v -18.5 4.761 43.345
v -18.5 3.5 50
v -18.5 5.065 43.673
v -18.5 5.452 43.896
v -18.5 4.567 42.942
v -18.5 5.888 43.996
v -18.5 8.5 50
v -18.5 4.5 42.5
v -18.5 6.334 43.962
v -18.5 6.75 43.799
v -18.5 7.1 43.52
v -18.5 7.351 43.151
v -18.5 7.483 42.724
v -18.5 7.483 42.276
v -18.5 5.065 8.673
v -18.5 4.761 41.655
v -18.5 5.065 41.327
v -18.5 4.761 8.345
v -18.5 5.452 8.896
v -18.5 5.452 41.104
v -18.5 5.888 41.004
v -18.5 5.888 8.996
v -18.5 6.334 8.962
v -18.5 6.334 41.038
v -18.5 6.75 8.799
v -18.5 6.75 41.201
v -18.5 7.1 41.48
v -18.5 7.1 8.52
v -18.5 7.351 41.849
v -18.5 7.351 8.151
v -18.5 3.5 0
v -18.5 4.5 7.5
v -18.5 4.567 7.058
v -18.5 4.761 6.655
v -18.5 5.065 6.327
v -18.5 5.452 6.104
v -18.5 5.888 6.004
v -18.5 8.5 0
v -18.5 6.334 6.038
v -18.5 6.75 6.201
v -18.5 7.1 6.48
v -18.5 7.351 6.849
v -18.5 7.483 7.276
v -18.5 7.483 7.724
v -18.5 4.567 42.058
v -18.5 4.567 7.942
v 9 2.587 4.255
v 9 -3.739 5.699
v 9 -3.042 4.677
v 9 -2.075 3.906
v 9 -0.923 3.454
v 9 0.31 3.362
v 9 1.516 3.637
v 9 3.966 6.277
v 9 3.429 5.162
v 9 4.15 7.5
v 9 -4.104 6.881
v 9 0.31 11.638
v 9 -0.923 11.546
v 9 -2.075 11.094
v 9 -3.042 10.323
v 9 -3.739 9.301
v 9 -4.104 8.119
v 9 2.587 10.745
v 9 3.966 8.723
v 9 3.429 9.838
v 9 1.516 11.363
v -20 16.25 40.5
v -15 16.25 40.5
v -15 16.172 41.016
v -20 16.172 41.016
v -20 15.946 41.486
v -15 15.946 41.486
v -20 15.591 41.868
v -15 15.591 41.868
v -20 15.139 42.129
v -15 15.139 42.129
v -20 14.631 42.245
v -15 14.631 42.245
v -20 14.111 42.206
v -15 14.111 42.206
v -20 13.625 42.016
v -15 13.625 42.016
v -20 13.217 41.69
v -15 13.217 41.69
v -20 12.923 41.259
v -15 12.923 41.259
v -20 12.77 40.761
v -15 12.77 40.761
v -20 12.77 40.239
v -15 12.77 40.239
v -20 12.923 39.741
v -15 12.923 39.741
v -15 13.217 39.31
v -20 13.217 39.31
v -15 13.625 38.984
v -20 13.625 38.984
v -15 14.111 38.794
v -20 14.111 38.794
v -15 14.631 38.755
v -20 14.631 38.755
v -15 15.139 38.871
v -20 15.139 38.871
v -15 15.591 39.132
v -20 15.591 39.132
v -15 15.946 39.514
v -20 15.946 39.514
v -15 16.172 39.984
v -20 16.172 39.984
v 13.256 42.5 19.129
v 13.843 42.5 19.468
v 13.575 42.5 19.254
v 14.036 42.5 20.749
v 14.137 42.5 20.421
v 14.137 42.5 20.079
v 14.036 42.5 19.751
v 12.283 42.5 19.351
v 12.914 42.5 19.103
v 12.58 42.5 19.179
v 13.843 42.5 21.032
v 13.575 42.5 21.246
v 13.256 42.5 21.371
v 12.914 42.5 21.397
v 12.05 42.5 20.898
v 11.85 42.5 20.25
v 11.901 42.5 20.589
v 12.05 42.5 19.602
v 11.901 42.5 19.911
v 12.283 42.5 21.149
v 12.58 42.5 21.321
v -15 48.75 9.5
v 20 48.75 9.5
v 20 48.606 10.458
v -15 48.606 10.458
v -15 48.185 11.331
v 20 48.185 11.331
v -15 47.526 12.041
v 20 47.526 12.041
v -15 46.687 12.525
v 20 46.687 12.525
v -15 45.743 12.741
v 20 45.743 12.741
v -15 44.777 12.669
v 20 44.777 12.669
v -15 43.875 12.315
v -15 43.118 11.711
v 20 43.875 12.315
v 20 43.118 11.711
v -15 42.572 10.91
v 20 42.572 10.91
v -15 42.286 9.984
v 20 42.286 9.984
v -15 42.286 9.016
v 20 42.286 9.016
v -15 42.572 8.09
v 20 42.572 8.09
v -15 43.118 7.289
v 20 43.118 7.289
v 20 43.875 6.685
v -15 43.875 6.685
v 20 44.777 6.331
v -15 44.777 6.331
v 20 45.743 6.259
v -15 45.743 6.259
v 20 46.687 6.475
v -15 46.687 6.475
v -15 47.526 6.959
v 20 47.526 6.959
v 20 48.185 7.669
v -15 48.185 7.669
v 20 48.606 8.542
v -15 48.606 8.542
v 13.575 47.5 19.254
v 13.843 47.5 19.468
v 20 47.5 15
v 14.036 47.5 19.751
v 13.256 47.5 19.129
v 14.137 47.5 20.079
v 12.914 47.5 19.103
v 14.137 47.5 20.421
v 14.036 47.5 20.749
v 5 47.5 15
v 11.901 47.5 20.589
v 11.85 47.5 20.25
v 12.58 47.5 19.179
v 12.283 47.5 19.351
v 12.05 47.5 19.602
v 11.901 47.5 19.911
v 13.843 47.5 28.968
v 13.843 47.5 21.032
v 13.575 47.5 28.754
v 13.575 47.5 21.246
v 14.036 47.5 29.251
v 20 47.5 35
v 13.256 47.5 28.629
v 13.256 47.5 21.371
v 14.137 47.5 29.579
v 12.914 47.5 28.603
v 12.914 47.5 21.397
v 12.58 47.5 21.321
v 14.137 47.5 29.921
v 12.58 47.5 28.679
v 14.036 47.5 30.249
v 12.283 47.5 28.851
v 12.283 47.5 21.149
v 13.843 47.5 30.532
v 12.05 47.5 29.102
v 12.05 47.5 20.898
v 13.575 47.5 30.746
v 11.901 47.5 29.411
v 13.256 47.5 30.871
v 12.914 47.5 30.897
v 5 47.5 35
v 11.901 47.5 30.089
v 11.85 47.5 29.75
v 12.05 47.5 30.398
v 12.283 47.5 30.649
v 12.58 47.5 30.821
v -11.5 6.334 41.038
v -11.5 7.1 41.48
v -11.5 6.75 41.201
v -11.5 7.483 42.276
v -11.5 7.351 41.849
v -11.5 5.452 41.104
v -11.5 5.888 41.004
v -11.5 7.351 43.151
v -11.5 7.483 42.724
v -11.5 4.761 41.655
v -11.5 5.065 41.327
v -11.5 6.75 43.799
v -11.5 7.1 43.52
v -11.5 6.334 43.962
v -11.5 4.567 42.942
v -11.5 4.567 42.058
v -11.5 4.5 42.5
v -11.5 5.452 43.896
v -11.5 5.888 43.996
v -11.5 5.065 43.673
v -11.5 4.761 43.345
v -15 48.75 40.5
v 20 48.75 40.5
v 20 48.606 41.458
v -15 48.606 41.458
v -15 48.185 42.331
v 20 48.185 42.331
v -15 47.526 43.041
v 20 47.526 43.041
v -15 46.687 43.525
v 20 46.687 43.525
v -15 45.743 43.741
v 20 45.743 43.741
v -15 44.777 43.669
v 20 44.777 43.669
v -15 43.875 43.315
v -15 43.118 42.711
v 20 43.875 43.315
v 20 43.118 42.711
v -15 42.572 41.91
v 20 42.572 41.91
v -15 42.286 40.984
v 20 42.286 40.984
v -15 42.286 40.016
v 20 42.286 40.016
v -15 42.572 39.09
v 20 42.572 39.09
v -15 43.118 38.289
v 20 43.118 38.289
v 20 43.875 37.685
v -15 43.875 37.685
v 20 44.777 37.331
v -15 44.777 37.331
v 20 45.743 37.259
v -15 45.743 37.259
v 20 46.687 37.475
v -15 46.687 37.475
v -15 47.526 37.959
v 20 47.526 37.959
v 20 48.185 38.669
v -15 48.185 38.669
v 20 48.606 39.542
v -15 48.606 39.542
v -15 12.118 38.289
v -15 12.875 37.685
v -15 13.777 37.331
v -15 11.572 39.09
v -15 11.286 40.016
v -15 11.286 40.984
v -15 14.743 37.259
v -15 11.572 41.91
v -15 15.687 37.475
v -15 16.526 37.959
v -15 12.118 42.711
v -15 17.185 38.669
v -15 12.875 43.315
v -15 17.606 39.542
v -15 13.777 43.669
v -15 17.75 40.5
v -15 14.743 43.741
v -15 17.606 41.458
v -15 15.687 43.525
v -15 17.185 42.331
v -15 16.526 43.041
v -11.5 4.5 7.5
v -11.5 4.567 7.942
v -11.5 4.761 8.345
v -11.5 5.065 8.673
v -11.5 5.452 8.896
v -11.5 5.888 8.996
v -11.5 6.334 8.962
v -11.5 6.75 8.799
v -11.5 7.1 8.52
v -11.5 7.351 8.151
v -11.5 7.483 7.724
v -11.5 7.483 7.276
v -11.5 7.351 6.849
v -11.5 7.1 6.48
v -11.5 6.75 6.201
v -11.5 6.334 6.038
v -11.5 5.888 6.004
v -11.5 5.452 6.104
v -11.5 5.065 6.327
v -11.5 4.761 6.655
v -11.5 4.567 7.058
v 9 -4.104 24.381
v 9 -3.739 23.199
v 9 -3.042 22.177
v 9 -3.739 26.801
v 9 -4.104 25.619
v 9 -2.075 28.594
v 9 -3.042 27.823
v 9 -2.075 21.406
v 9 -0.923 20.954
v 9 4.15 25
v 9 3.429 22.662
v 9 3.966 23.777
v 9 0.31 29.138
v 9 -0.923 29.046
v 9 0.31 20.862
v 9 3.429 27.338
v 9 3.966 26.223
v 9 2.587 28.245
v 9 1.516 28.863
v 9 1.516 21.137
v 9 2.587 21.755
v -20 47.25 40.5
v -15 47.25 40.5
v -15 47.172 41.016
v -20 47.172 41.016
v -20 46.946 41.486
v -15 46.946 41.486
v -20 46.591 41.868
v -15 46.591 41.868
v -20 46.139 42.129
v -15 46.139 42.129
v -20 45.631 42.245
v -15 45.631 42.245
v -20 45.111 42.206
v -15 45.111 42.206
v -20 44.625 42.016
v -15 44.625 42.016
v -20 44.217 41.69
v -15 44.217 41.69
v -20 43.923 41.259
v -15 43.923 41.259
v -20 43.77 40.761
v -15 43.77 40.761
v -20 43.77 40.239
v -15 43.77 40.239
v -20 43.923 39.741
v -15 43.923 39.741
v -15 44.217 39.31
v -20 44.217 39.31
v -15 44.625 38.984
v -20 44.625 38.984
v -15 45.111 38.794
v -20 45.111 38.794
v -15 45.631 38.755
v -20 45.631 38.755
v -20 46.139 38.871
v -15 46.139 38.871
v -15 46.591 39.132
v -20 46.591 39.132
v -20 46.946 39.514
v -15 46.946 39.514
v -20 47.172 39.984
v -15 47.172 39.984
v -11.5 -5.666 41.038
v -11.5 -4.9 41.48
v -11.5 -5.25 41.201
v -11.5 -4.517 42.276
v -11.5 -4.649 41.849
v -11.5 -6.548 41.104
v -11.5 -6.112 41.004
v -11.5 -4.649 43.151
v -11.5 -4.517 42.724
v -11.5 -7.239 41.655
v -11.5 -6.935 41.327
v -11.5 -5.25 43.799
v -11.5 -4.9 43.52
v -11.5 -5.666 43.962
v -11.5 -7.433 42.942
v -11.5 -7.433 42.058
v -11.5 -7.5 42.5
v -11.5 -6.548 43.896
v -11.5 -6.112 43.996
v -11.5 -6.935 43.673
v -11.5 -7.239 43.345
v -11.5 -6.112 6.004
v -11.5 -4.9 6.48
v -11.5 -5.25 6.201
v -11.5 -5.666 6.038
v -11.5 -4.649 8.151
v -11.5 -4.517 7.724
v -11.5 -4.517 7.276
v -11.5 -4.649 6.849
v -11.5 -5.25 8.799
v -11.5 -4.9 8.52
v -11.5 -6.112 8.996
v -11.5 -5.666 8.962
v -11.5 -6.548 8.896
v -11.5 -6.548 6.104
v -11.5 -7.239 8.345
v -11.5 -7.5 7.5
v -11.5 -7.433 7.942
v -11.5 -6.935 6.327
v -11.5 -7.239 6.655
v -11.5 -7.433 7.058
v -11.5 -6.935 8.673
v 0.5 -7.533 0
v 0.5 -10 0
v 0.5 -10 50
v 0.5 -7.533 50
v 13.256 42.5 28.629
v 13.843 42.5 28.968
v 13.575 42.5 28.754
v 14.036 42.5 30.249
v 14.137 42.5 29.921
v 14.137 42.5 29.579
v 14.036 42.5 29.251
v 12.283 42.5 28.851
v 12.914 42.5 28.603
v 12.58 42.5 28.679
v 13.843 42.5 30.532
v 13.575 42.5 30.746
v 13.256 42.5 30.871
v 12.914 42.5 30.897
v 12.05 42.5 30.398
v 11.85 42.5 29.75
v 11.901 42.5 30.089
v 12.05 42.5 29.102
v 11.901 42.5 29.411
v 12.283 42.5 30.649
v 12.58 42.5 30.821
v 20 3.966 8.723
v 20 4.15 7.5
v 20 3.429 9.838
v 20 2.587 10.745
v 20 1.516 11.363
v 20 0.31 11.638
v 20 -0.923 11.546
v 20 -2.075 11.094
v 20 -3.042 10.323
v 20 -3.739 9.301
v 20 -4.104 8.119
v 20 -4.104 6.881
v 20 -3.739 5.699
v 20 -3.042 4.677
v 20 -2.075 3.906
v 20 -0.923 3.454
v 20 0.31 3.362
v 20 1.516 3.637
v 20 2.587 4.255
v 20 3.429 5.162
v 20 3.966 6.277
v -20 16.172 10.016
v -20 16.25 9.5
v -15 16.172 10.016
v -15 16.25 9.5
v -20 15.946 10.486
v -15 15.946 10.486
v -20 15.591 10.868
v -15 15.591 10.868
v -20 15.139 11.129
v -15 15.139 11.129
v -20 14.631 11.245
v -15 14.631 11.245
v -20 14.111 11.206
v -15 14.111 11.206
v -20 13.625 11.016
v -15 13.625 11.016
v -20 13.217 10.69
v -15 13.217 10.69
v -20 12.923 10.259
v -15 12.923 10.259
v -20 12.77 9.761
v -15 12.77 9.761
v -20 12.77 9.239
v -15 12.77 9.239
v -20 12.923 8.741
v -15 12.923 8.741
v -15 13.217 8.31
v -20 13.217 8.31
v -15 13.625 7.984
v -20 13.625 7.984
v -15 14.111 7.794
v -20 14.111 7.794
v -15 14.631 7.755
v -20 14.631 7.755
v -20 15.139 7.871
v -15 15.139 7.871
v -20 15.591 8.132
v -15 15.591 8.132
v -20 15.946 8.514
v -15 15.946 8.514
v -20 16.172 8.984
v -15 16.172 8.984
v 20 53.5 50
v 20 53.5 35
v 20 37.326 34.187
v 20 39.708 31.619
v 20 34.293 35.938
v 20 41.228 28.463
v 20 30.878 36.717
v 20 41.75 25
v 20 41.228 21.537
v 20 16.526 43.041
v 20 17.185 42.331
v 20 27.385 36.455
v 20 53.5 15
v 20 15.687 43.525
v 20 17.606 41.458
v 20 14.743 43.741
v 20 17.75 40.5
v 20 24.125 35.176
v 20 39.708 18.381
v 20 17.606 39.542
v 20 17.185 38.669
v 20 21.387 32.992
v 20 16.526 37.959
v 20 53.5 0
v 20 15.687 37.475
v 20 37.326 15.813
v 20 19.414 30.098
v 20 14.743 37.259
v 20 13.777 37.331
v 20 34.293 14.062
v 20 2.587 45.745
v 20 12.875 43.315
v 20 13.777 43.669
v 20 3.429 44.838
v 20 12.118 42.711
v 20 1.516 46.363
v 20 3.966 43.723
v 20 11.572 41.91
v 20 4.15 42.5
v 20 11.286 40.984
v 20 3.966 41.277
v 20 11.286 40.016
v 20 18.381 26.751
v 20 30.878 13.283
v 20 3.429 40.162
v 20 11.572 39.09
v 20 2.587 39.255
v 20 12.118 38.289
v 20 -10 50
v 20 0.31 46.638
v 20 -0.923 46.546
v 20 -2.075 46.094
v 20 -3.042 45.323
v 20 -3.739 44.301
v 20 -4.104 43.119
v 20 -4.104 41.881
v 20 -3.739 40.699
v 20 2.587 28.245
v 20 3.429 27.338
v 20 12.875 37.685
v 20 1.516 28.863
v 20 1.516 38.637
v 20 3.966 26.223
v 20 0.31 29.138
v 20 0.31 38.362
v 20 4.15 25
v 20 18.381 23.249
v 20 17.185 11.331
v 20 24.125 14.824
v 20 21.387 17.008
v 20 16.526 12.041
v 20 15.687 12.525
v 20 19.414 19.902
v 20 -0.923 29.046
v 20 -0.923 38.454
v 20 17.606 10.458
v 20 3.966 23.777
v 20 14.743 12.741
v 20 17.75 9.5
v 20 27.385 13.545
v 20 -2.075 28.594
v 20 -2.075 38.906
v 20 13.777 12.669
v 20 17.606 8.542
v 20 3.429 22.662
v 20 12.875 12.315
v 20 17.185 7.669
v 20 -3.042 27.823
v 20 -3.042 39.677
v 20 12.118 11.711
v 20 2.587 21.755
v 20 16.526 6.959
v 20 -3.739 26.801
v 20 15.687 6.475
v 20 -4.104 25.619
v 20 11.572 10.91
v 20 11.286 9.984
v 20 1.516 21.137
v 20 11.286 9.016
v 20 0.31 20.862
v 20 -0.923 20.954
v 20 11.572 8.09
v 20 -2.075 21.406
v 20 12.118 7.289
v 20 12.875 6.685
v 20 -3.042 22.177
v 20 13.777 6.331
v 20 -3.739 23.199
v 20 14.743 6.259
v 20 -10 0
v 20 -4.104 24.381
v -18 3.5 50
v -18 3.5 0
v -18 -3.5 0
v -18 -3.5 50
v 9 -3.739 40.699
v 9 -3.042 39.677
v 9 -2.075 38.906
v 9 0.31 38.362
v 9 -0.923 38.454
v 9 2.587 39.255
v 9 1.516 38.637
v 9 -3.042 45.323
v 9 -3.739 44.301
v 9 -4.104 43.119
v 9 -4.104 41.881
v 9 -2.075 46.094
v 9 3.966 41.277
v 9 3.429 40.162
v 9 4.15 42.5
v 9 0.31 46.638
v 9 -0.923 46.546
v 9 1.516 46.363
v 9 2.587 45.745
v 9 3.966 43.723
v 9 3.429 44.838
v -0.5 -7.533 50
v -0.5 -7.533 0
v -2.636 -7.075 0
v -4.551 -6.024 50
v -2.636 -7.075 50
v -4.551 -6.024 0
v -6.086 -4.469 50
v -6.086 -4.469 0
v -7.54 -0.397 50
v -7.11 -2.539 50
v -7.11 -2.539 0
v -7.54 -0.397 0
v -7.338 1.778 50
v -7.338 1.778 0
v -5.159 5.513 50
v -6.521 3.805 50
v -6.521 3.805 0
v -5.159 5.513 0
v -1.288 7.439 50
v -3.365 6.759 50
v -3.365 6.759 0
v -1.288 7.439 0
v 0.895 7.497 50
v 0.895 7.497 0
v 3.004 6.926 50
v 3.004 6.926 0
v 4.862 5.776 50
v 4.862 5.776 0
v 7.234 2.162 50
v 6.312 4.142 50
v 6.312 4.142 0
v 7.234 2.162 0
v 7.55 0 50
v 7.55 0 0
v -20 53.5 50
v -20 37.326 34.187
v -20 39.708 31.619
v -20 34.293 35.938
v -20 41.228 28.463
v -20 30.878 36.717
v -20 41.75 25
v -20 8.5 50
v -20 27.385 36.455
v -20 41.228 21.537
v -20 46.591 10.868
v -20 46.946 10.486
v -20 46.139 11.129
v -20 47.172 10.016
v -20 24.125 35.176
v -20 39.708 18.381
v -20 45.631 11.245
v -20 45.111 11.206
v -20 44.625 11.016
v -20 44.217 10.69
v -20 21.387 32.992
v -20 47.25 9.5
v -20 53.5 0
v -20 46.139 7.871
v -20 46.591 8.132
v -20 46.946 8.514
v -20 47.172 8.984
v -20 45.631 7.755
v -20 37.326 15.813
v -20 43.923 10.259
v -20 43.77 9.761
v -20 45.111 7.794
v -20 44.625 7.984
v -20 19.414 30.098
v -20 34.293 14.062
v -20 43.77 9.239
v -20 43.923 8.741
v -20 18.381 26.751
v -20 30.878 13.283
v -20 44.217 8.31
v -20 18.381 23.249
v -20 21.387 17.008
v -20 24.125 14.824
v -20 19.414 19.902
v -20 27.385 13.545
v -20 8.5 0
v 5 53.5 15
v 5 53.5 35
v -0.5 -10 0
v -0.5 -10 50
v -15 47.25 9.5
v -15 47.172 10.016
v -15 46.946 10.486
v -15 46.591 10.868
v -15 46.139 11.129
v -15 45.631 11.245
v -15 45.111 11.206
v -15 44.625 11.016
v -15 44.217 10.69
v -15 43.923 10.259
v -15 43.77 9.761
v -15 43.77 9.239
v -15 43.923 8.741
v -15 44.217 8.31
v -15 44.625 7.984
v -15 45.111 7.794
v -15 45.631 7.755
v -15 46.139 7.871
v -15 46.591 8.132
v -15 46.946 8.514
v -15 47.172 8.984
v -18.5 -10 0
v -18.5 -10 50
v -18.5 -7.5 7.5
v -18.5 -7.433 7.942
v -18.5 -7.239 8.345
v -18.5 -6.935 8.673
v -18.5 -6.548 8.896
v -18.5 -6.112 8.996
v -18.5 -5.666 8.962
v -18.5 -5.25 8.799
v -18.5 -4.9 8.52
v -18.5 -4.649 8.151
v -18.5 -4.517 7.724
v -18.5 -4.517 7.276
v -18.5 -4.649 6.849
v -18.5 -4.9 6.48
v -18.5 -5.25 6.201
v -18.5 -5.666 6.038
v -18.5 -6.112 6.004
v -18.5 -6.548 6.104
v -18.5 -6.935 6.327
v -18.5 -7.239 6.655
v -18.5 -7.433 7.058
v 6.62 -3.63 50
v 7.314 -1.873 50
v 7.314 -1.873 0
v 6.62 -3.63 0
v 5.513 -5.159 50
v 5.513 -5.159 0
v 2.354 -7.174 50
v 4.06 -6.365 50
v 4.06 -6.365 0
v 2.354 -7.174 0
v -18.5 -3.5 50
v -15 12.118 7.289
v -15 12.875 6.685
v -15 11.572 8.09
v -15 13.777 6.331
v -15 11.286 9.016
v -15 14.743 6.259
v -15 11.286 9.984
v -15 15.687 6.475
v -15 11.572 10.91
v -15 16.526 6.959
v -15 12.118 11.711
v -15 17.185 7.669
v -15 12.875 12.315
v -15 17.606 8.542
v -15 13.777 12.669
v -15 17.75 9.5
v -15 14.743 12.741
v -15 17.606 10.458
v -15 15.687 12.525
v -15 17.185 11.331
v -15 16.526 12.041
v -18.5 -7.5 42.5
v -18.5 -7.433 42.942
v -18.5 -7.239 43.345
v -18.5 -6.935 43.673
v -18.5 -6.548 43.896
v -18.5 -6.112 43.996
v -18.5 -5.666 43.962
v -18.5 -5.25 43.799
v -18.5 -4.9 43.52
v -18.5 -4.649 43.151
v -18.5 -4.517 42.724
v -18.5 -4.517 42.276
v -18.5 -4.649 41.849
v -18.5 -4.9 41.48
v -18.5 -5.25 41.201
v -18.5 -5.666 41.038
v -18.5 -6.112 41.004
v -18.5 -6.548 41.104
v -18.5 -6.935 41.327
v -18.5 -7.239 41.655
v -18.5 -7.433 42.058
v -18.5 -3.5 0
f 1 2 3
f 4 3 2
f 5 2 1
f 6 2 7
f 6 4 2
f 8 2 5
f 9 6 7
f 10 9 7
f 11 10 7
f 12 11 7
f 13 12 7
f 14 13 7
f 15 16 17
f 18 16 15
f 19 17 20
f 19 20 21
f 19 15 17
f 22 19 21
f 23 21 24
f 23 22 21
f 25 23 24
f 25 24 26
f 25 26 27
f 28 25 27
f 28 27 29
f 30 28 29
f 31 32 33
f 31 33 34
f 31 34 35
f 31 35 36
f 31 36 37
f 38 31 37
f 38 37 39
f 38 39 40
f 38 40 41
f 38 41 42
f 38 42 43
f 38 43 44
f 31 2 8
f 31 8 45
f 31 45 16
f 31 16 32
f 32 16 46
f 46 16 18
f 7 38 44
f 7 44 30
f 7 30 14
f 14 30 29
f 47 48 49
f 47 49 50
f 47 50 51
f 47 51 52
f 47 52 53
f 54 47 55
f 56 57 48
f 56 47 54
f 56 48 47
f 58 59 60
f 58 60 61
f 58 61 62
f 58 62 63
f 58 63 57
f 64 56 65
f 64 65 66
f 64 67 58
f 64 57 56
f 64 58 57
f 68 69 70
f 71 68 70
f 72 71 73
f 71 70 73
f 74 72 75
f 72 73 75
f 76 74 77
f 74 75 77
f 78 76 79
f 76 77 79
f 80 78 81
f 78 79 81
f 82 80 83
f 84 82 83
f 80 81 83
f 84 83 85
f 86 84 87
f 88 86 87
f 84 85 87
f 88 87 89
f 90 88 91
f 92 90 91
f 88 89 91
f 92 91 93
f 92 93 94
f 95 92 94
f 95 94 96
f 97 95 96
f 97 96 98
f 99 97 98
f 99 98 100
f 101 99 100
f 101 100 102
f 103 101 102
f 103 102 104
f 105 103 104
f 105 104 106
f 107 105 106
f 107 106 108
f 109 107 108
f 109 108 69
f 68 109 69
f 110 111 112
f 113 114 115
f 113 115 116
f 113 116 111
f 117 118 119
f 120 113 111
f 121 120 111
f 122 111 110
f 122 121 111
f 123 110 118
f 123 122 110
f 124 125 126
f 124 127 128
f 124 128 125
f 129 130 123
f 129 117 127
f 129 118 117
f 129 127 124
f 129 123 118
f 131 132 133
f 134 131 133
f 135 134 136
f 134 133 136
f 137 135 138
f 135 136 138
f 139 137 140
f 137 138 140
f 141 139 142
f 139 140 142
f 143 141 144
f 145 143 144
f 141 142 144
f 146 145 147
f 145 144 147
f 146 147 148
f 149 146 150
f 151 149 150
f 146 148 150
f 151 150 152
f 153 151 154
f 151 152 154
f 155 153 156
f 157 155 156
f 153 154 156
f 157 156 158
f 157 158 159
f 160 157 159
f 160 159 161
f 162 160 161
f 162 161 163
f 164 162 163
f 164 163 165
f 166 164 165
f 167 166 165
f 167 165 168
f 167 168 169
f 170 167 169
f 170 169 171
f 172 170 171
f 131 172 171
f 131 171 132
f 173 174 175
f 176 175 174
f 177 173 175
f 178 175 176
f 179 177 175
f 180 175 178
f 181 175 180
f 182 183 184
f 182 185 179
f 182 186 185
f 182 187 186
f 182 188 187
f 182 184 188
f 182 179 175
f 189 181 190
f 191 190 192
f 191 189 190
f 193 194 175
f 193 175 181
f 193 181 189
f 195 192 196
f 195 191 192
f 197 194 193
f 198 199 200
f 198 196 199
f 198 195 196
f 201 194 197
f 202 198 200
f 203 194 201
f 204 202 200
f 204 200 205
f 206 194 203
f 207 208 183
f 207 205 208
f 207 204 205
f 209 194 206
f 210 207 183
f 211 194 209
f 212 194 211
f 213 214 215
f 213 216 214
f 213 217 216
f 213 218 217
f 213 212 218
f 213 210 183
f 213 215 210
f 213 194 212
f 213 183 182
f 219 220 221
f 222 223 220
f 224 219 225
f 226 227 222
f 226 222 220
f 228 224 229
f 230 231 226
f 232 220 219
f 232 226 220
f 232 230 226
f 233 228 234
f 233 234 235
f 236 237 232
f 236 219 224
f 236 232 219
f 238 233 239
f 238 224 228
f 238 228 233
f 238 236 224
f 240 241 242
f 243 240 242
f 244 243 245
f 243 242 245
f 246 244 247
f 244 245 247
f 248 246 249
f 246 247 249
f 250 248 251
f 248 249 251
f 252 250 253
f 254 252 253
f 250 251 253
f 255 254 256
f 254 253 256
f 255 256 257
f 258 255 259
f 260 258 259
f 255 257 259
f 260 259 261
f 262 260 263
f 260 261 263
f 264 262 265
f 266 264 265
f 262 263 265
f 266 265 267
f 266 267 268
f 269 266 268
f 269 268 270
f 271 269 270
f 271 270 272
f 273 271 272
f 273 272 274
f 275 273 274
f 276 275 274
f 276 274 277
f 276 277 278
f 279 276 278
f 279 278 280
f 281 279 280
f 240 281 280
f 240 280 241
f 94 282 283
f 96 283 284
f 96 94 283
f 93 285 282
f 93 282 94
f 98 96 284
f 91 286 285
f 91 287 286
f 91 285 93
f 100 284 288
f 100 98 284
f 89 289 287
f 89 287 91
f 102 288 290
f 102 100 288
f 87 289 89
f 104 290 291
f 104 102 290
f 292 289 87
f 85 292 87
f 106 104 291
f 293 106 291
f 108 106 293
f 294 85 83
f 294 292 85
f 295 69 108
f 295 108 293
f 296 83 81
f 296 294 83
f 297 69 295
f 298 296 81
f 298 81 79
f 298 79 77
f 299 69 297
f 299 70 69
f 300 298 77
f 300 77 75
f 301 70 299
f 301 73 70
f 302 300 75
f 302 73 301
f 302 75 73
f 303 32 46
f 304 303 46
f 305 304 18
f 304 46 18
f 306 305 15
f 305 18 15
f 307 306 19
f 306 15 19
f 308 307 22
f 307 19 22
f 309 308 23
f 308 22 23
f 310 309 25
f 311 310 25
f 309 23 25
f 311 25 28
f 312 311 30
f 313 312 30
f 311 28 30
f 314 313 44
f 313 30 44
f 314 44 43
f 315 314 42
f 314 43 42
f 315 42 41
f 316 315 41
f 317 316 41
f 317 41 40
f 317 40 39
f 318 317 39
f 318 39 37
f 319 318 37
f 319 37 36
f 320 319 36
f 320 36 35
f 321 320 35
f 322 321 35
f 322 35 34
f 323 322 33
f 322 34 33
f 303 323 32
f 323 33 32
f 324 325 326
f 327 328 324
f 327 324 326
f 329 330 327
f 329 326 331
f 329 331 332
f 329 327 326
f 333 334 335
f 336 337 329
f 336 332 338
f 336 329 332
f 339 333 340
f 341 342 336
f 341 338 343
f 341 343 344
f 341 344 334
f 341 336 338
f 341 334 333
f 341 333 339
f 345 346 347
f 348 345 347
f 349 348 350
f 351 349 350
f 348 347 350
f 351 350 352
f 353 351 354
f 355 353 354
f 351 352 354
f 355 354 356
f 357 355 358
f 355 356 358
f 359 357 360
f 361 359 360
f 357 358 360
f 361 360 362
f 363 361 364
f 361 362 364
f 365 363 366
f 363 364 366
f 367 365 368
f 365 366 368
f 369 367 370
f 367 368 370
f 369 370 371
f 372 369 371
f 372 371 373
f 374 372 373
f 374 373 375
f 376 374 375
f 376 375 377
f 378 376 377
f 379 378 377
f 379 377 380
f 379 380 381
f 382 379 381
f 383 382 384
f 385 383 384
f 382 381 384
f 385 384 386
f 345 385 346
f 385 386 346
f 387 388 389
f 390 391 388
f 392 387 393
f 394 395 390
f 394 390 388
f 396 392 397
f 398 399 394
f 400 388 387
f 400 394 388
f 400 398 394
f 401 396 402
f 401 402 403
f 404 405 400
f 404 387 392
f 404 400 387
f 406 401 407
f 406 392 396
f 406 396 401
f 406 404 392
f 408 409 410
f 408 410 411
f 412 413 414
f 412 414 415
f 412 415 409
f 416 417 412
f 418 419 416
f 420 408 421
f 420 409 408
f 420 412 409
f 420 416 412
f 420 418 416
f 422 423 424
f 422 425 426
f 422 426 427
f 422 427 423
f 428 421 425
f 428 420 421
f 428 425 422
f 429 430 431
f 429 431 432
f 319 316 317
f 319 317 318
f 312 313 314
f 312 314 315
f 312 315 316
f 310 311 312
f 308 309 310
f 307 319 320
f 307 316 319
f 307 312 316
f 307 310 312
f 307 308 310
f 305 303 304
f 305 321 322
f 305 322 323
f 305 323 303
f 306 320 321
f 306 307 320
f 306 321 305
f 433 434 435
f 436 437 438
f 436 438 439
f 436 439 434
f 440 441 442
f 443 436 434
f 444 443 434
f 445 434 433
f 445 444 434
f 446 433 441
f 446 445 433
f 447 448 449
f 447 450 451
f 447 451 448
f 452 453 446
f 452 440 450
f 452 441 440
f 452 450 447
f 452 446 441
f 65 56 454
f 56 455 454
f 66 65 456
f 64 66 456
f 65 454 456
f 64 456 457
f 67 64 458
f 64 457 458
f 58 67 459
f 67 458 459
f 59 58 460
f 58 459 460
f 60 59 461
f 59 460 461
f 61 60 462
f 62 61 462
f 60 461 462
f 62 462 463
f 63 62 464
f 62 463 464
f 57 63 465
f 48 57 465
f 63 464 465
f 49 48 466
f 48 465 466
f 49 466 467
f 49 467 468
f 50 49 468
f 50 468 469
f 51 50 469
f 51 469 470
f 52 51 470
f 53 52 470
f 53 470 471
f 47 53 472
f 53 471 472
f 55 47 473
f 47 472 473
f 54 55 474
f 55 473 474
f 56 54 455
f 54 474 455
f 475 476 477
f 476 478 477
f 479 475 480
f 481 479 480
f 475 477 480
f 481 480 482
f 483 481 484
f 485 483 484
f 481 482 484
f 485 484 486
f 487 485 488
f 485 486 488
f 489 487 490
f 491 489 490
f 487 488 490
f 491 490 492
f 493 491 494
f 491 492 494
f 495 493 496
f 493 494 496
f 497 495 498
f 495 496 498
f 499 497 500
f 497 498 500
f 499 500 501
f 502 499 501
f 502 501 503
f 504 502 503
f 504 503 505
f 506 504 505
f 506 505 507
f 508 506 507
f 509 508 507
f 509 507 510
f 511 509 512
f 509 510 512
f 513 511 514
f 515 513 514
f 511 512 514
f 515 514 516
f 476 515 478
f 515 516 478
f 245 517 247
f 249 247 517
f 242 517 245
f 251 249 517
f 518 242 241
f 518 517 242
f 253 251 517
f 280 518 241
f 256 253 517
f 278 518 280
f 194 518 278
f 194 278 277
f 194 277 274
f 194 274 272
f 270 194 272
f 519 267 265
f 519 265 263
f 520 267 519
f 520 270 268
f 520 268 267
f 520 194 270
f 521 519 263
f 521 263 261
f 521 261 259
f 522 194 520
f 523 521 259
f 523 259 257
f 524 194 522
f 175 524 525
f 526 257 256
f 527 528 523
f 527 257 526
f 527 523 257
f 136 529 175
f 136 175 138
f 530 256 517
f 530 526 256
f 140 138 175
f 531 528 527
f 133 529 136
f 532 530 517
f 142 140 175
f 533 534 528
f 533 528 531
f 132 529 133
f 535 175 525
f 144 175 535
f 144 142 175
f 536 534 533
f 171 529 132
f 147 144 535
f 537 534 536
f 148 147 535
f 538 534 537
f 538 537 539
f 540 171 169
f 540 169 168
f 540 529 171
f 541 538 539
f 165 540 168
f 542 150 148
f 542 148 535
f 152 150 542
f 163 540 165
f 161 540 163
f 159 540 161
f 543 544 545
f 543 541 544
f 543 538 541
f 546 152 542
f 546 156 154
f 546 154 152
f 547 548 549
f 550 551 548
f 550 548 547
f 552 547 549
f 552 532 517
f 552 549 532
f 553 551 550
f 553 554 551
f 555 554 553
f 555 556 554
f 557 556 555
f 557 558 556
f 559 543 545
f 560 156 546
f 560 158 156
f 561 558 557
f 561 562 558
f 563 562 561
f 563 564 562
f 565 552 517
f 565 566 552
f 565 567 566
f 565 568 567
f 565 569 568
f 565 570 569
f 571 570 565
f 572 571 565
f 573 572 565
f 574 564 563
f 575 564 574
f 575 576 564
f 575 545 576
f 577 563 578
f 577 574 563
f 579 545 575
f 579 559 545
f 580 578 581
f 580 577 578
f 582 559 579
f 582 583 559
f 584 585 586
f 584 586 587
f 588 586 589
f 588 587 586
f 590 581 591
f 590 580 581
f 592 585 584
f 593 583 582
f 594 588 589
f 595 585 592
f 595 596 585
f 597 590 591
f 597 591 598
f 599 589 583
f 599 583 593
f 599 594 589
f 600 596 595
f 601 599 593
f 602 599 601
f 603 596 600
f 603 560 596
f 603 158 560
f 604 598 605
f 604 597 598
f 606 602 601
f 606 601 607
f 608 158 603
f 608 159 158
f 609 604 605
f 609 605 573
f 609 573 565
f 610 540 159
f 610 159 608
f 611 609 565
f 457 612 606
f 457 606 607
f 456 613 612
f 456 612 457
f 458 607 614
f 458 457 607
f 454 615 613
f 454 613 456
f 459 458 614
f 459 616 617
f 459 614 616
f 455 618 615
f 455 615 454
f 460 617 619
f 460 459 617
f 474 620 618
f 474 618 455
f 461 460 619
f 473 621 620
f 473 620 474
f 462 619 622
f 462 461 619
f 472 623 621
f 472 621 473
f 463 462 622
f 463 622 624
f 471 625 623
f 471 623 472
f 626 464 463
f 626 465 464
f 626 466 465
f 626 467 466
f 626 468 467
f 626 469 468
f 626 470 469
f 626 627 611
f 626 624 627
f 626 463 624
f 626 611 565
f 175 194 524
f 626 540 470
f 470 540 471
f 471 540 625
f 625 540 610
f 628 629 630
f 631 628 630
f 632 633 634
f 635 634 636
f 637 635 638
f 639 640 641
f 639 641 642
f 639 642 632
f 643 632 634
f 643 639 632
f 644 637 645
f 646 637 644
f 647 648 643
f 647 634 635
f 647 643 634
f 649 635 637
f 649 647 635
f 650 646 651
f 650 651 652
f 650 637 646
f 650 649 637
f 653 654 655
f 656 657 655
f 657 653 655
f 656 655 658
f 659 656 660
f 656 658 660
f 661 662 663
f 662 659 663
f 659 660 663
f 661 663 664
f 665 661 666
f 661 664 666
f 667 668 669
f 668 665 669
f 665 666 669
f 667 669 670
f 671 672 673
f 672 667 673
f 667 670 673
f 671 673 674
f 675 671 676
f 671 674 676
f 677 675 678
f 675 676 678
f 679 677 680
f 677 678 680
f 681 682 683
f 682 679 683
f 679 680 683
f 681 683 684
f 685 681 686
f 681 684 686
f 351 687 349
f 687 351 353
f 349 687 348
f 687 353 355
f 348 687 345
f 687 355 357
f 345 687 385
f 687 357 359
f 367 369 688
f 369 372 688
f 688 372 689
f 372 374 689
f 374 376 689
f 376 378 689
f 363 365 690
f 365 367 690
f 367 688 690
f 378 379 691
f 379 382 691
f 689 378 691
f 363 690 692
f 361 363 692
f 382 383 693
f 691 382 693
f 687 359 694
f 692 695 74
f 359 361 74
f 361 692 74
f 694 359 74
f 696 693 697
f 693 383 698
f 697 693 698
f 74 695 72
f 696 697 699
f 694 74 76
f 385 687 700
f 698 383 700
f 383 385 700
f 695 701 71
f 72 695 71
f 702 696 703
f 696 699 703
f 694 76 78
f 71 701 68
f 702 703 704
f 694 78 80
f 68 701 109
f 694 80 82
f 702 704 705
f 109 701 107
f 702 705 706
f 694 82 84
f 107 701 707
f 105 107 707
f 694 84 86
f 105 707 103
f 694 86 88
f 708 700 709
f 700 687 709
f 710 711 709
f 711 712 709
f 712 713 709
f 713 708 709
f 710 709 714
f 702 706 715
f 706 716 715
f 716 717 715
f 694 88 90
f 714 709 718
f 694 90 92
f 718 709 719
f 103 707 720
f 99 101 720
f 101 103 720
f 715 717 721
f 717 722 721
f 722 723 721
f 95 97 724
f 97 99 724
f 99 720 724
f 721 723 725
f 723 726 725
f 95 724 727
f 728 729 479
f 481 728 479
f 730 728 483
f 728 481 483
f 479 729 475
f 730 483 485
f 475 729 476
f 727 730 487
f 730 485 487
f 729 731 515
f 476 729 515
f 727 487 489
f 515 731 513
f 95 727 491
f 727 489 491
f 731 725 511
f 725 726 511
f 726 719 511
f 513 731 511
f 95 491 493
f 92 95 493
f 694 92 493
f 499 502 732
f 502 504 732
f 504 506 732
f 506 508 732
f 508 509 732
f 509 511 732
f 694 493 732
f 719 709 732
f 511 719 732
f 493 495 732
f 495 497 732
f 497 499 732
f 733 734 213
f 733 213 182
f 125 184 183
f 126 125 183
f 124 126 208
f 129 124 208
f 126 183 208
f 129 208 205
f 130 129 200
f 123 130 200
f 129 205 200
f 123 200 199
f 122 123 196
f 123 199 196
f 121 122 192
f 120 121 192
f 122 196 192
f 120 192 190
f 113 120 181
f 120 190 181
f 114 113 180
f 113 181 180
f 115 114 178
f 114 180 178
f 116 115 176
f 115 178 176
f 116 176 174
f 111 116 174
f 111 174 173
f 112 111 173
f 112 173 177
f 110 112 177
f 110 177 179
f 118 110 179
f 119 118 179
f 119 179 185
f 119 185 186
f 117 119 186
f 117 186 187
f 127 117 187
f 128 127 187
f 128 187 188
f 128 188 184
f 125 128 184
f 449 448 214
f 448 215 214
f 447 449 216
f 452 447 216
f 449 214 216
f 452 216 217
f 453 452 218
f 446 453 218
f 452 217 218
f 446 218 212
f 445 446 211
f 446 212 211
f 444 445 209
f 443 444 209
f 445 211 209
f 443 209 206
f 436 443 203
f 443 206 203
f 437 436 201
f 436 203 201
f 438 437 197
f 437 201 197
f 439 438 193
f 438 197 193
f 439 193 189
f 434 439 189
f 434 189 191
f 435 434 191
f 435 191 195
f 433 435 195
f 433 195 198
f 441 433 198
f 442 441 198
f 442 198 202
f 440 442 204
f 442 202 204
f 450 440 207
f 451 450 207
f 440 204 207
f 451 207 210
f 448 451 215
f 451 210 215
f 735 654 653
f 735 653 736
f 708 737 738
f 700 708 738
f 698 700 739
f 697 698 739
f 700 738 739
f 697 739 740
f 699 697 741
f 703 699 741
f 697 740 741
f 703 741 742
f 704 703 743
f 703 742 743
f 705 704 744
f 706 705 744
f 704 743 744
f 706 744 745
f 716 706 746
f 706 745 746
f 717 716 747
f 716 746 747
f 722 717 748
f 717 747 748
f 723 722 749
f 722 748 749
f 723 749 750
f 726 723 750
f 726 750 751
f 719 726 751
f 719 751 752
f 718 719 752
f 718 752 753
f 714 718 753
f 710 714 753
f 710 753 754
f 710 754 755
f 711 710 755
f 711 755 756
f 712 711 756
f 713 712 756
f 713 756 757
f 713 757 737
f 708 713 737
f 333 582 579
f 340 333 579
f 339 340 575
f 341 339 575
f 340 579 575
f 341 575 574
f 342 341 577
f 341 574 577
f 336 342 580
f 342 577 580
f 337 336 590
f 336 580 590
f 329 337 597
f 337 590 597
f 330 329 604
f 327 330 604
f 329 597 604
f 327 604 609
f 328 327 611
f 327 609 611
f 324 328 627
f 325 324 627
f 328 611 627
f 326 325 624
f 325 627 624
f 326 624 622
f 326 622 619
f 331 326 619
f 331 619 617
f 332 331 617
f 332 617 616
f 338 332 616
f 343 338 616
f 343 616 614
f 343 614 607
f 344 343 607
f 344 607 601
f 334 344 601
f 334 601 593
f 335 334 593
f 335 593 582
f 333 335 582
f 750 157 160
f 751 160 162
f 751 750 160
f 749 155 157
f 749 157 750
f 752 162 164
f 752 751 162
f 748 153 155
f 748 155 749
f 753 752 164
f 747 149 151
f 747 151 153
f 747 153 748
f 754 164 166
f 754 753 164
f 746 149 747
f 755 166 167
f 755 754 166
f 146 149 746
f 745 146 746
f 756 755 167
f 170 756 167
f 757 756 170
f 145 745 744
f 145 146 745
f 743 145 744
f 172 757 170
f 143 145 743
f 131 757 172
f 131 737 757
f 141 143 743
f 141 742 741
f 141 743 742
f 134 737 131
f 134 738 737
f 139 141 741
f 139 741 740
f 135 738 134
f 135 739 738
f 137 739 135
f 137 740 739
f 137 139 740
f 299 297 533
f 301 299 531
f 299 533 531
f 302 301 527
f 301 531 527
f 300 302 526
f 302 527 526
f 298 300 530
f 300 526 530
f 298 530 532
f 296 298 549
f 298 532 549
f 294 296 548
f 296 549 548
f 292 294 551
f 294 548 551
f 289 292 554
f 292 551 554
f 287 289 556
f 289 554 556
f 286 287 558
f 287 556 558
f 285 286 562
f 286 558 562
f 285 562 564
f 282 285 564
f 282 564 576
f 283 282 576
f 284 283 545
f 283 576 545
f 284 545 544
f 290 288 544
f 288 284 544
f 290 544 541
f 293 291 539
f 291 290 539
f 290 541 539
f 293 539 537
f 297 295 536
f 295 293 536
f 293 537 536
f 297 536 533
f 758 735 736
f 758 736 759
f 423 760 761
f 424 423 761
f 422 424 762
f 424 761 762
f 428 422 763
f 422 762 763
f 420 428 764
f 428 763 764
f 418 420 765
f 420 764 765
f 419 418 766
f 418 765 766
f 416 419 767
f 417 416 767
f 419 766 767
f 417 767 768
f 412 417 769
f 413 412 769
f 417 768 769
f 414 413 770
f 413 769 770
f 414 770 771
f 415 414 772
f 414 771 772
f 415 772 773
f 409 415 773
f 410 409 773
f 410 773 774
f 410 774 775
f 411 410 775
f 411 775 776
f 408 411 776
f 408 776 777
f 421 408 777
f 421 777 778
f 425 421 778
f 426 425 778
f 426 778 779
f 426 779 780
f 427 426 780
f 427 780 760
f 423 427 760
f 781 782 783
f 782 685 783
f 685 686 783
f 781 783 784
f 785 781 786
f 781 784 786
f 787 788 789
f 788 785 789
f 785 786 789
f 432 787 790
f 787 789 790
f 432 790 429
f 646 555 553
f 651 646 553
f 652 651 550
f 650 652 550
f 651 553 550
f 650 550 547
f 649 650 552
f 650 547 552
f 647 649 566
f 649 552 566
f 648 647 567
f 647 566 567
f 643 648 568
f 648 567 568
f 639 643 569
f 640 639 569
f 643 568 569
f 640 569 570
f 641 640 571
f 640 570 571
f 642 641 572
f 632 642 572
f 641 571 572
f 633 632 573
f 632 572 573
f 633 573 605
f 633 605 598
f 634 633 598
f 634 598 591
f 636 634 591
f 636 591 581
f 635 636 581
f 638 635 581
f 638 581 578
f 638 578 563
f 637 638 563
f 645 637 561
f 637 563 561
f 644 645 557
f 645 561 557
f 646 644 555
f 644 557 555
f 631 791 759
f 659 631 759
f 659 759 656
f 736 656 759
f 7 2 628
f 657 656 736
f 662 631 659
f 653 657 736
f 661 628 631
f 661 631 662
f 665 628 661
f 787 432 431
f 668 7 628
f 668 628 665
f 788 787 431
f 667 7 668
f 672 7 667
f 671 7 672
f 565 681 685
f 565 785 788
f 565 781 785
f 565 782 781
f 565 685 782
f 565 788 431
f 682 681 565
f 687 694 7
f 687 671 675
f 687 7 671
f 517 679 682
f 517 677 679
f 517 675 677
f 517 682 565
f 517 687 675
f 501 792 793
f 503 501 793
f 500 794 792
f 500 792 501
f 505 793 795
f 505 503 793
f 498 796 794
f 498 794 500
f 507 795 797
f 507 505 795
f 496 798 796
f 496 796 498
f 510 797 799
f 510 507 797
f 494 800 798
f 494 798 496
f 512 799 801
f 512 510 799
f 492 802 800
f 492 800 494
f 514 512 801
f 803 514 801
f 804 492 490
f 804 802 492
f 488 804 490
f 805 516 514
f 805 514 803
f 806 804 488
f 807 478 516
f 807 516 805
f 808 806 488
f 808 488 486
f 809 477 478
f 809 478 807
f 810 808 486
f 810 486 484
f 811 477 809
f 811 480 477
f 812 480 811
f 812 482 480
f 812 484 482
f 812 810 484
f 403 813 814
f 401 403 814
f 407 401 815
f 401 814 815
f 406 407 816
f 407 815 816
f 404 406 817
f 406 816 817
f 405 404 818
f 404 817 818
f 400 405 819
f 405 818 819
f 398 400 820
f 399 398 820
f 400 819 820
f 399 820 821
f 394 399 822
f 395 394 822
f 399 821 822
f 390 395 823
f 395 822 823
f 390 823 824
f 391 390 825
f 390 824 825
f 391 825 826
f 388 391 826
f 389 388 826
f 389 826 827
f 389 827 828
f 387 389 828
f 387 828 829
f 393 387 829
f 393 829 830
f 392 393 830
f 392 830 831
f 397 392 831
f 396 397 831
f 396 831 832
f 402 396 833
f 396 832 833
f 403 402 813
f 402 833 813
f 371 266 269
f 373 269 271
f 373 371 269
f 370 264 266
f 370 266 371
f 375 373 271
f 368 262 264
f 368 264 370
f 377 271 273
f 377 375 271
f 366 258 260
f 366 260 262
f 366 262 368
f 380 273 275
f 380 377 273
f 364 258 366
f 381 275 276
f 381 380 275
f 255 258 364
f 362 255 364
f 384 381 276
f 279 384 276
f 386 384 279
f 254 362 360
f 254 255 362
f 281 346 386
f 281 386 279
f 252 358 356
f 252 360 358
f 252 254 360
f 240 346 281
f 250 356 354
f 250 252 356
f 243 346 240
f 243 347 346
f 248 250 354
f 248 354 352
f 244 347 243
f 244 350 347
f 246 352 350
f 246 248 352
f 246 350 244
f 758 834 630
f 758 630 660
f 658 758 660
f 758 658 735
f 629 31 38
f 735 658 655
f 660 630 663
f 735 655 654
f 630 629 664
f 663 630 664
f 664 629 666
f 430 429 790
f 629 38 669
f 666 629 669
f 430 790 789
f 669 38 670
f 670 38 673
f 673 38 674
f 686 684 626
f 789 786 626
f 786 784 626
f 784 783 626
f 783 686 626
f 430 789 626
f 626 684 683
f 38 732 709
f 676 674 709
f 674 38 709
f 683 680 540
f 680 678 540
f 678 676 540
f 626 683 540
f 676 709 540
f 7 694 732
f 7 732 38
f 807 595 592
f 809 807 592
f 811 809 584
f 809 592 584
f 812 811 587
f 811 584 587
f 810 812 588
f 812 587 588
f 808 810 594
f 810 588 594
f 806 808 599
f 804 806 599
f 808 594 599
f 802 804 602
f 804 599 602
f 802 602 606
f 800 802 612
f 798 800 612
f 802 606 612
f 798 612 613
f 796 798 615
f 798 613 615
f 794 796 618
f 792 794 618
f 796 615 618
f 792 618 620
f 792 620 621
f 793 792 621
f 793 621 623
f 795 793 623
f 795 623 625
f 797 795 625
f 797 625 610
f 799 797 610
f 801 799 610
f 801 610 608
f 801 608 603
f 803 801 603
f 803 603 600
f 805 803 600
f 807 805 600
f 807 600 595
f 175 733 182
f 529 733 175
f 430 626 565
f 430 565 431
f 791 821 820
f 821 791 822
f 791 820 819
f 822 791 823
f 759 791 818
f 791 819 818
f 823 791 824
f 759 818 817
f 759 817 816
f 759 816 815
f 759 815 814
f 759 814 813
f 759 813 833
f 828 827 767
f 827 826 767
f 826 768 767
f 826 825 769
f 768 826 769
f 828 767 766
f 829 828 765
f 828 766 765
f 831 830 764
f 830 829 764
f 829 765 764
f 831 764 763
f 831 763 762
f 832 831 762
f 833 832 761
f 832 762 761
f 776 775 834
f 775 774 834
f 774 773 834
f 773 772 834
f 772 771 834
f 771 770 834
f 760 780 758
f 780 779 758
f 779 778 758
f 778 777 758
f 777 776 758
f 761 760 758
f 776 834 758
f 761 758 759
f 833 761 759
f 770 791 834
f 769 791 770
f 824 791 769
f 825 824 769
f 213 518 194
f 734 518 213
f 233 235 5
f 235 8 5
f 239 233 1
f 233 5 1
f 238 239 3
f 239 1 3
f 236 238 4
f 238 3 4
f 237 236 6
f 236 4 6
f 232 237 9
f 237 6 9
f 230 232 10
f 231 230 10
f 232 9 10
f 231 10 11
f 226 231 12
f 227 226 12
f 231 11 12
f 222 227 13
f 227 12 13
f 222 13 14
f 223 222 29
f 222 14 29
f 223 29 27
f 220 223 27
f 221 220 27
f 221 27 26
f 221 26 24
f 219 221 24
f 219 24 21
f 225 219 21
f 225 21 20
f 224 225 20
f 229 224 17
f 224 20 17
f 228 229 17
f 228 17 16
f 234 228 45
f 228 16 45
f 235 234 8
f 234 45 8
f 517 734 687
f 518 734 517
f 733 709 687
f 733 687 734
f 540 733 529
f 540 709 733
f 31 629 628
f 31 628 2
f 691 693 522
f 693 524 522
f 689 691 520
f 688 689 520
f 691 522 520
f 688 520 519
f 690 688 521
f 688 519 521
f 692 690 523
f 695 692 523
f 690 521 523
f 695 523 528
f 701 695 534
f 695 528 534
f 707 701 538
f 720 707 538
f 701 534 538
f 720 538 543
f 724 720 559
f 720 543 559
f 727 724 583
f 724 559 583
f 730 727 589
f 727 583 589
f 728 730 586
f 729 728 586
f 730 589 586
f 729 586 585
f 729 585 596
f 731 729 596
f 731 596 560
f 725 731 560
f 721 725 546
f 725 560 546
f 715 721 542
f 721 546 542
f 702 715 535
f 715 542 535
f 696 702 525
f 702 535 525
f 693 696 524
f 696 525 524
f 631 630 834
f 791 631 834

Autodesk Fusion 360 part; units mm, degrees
sketch "Skizze1" plane through (0, 0, 0) normal (0, 0, 1) x (1, 0, 0)
  circle A0 centre (0, 0) radius 7.55
  line L0 (20, -10) -> (-10, -10)
  line L1 (-10, -10) -> (-10, 53.5)
  line L2 (-10, 53.5) -> (20, 53.5)
  line L3 (20, 53.5) -> (20, -10)
  line L4 (0, 0) -> (0, -10)
  line L5 (0, -10) -> (-0.5, -10)
  line L6 (-0.5, -10) -> (0.5, -10)
  line L7 (0.5, -10) -> (0.5, -7.3)
  line L8 (0.5, -7.3) -> (-0.5, -7.3)
  line L9 (-0.5, -7.3) -> (-0.5, -10)
  line L10 (-18, 3.5) -> (-18, -3.5)
  line L11 (-18, 3.5) -> (-18.5, 3.5)
  line L12 (-18, -3.5) -> (-18.5, -3.5)
  line L13 (-18.5, -3.5) -> (-18.5, -10)
  line L14 (-18.5, -10) -> (-10, -10)
  line L15 (-18.5, 3.5) -> (-18.5, 8.5)
  line L16 (-18.5, 8.5) -> (-10, 8.5)
  line L17 (-10, 53.5) -> (-20, 53.5)
  line L18 (-20, 53.5) -> (-20, 8.5)
  line L19 (-20, 8.5) -> (-10, 8.5)
  line L20 (-10, 8.5) -> (-10, 53.5)
  dimension "d1" = 15.1
  dimension "d4" = 20
  dimension "d5" = 10
  dimension "d6" = 10
  dimension "d7" = 63.5
  dimension "d15" = 18
  dimension "d16" = 7
  dimension "d17" = 3.5
  dimension "d18" = 0.5
  dimension "d19" = 0.5
  dimension "d54" = 10
extrude "Extrusion1" add sketch "Skizze1" along normal blind 50 contours A0 L0 L1 L2 L3 L7 L9 L20 | L1 L10 L11 L12 L13 L14 L15 L16 L19 | L1 L16 L17 L18 L19 L20
sketch "Skizze2" plane through (20, 0, 0) normal (1, 0, 0) x (0, 1, 0)
  line L0 (-10, 0) -> (53.5, 0)
  line L1 (53.5, 0) -> (53.5, 50)
  line L2 (53.5, 50) -> (-10, 50)
  line L3 (-10, 50) -> (-10, 0)
  circle A0 centre (0, 25) radius 4.15
  circle A1 centre (30, 25) radius 11.75
  line L4 (14.5, 40.5) -> (45.5, 40.5)
  line L5 (45.5, 40.5) -> (45.5, 9.5)
  line L6 (45.5, 9.5) -> (14.5, 9.5)
  line L7 (14.5, 9.5) -> (14.5, 40.5)
  circle A2 centre (14.5, 40.5) radius 3.25
  circle A3 centre (45.5, 40.5) radius 3.25
  circle A4 centre (45.5, 9.5) radius 3.25
  circle A5 centre (14.5, 9.5) radius 3.25
  circle A6 centre (14.5, 40.5) radius 1.75
  circle A7 centre (45.5, 40.5) radius 1.75
  circle A8 centre (45.5, 9.5) radius 1.75
  circle A9 centre (14.5, 9.5) radius 1.75
  circle A10 centre (0, 7.5) radius 4.15
  circle A11 centre (0, 42.5) radius 4.15
  dimension "d10" = 8.3
  dimension "d11" = 10
  dimension "d42" = 25
  dimension "d55" = 30
  dimension "d56" = 25
  dimension "d57" = 23.5
  dimension "d58" = 31
  dimension "d59" = 31
  dimension "d60" = 15.5
  dimension "d61" = 15.5
  dimension "d62" = 6.5
  dimension "d63" = 3.5
  dimension "d78" = 10
  dimension "d80" = 10
  dimension "d81" = 17.5
  dimension "d82" = 17.5
extrude "Extrusion7" cut sketch "Skizze2" against normal blind 40 contours A1 | L4 L7 A6 | L4 L7 A6 | L4 L5 A7 | L4 L5 A7 | L6 L7 A9 | L6 L7 A9 | L5 L6 A8 | L5 L6 A8
extrude "Extrusion8" cut sketch "Skizze2" against normal blind 35 contours L4 L7 A2 A6 | L4 L7 A2 A6 | L4 L5 A3 A7 | L4 L5 A3 A7 | L6 L7 A5 A9 | L6 L7 A5 A9 | L5 L6 A4 A8 | L5 L6 A4 A8
extrude "Extrusion2" cut sketch "Skizze2" against normal blind 11 contours A0 | A10 | A11
sketch "Skizze3" plane through (0, 0, 50) normal (0, 0, 1) x (-1, 0, 0)
  line L0 (18, -3.5) -> (18, 3.5)
  line L1 (18, 3.5) -> (18.5, 3.5)
  line L2 (18.5, 3.5) -> (18.5, 10)
  line L3 (18.5, 10) -> (10, 10)
  line L4 (10, 10) -> (0.5, 10)
  line L5 (0.5, 10) -> (0.5, 7.5334)
  arc A0 (-0.5, 7.5334) -> (0.5, 7.5334) centre (0, 0) ccw
  line L6 (-0.5, 7.5334) -> (-0.5, 10)
  line L7 (-0.5, 10) -> (-20, 10)
  line L8 (-20, 10) -> (-20, -53.5)
  line L9 (-20, -53.5) -> (20, -53.5)
  line L10 (18.5, -8.5) -> (18.5, -3.5)
  line L11 (18.5, -3.5) -> (18, -3.5)
  line L12 (-20, -53.5) -> (10, -53.5)
  line L13 (10, -53.5) -> (10, -8.5)
  line L14 (-20, -8.5) -> (-20, -53.5)
  arc A1 (-10, -8.5) -> (10, -8.5) centre (0, 0) ccw
  line L15 (-10, -8.5) -> (-20, -8.5)
  line L16 (20, -53.5) -> (20, -8.5)
  line L17 (20, -8.5) -> (18.5, -8.5)
sketch "Skizze5" plane through (0, 53.5, 0) normal (0, 1, 0) x (-1, 0, 0)
  line L0 (-20, 50) -> (-20, 0)
  line L1 (-20, 0) -> (20, 0)
  line L2 (-20, 25) -> (-13, 25)
  line L3 (-13, 25) -> (-13, 29.75)
  line L4 (-13, 25) -> (-13, 20.25)
  circle A0 centre (-13, 29.75) radius 1.15
  circle A1 centre (-13, 20.25) radius 1.15
  line L5 (20, 50) -> (-20, 50)
  line L6 (20, 0) -> (20, 50)
  dimension "d23" = 7
  dimension "d24" = 4.75
  dimension "d25" = 2.3
  dimension "d26" = 2.3
extrude "Extrusion4" cut sketch "Skizze5" against normal blind 11 contours A0 | A1
sketch "Skizze6" plane through (-18.5, 0, 0) normal (-1, 0, 0) x (0, -1, 0)
  line L0 (-8.5, 0) -> (-3.5, 0)
  line L1 (-3.5, 0) -> (-3.5, 50)
  line L2 (-3.5, 50) -> (-8.5, 50)
  line L3 (-6, 50) -> (-6, 0)
  line L4 (6, 50) -> (6, 0)
  circle A0 centre (-6, 42.5) radius 1.5
  circle A1 centre (-6, 7.5) radius 1.5
  circle A2 centre (6, 7.5) radius 1.5
  circle A3 centre (6, 42.5) radius 1.5
  line L5 (3.5, 50) -> (10, 50)
  line L6 (3.5, 0) -> (10, 0)
  line L7 (-8.5, 50) -> (-8.5, 0)
  circle A4 centre (-6, 42.5) radius 3.25
  circle A5 centre (-6, 7.5) radius 3.25
  dimension "d29" = 12
  dimension "d30" = 3
  dimension "d31" = 3
  dimension "d32" = 3
  dimension "d33" = 3
  dimension "d35" = 7.5
  dimension "d36" = 7.5
  dimension "d37" = 7.5
  dimension "d38" = 7.5
  dimension "d73" = 6.5
  dimension "d74" = 6.5
extrude "Extrusion5" cut sketch "Skizze6" against normal blind 7 contours L3 A1 | L3 A1 | L3 A0 | L3 A0 | L4 A3 | L4 A2 | L4 A2 | L4 A3
sketch "Skizze9" plane through (0, 53.5, 0) normal (0, 1, 0) x (-1, 0, 0)
  circle A0 centre (-13, 29.75) radius 1.15
  circle A1 centre (-13, 20.25) radius 1.15
  line L0 (-20, 0) -> (20, 0)
  line L1 (20, 0) -> (20, 50)
  line L2 (20, 50) -> (-20, 50)
  line L3 (-20, 50) -> (-20, 0)
  line L4 (-20, 35) -> (-5, 35)
  line L5 (-5, 35) -> (-5, 15)
  line L6 (-5, 15) -> (-20, 15)
  line L7 (-20, 15) -> (-20, 35)
  line L8 (-20, 40.5) -> (-20, 9.5)
  point P0 (-20, 25)
  dimension "d68" = 15
  dimension "d69" = 20
  dimension "d70" = 10
extrude "Extrusion9" cut sketch "Skizze9" against normal blind 6 contours L3 L4 L5 L6 L7 L8
sketch "Skizze10" plane through (0, 0, 0) normal (0, 0, 1) x (1, 0, 0)
equation "d60 = ( 31 / 2 ) * 1 mm"
equation "d61 = ( 31 / 2 ) * 1 mm"
